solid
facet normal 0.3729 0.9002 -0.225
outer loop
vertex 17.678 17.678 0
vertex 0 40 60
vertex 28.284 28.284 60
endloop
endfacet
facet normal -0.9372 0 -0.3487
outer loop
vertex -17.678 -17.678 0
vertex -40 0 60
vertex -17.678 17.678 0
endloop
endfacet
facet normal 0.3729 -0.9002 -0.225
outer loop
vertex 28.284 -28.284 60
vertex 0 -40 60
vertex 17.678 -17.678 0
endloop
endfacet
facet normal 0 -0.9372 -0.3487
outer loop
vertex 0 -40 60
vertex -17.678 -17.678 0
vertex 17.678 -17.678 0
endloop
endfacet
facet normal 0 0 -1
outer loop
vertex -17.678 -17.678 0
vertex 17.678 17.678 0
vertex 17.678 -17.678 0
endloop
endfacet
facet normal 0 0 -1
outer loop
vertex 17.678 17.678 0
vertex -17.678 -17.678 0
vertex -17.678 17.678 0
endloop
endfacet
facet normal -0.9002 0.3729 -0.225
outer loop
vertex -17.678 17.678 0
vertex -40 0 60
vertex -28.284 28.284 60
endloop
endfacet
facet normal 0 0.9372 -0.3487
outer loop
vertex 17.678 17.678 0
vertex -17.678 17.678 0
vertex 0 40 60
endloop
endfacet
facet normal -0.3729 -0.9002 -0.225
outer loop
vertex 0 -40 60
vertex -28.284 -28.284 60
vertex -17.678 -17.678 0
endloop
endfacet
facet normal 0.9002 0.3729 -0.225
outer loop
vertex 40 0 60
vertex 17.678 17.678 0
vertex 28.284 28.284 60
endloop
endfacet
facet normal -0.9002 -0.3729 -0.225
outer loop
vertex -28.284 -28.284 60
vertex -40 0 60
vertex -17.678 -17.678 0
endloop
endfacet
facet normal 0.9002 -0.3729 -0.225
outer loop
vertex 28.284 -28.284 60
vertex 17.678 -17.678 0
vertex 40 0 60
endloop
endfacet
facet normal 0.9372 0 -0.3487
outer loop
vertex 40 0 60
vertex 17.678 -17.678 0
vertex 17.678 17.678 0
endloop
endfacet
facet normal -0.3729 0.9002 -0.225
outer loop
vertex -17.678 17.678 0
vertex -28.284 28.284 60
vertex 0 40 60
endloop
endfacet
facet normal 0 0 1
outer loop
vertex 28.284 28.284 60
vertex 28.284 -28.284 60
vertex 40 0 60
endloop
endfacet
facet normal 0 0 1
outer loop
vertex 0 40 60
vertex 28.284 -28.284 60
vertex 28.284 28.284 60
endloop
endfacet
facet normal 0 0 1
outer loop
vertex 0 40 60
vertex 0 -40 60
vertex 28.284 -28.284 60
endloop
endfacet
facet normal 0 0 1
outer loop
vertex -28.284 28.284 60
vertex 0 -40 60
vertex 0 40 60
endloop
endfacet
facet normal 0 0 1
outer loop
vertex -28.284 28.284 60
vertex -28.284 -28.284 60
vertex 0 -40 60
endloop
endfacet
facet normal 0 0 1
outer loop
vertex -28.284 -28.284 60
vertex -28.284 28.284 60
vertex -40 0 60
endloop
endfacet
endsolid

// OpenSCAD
// Customizable Polygon Morph Vase

use <MCAD/regular_shapes.scad>;

// Number of sides of bottom polygon
bottom_sides = 4;

// Circumradius of bottom polygon (mm from center to corner)
bottom_radius = 25;

// Number of sides of top polygon
top_sides = 8;

// Circumradius of top polygon (mm from center to corner)
top_radius = 40;

// Height of vase in millimeters
vase_height=60;

// Clockwise rotation of top relative to bottom in degrees
vase_twist=0;

// Keep the bottom at z 0 if the bottom is trimmed
translate([0, 0, bottom_radius > top_radius ? -1 : 0])

// Trim vertical extension from end with larger radius
difference() {
	
	// The convex hull of the top and bottom shape forms the body of the vase.
	hull() {
	
		// Bottom
		linear_extrude(height=1)
		reg_polygon(
			sides=bottom_sides,
			radius=bottom_radius);
	
		// Top
		translate([0, 0, vase_height])
		rotate([0, 0, -vase_twist])
		linear_extrude(height=1)
		reg_polygon(
			sides=top_sides,
			radius=top_radius);
	}
	
	if (bottom_radius > top_radius) {
		linear_extrude(height = 1) circle(r = bottom_radius + 1);
	} else {
		translate([0, 0, vase_height]) linear_extrude(height=2) circle(r = top_radius + 1);
	}
}
